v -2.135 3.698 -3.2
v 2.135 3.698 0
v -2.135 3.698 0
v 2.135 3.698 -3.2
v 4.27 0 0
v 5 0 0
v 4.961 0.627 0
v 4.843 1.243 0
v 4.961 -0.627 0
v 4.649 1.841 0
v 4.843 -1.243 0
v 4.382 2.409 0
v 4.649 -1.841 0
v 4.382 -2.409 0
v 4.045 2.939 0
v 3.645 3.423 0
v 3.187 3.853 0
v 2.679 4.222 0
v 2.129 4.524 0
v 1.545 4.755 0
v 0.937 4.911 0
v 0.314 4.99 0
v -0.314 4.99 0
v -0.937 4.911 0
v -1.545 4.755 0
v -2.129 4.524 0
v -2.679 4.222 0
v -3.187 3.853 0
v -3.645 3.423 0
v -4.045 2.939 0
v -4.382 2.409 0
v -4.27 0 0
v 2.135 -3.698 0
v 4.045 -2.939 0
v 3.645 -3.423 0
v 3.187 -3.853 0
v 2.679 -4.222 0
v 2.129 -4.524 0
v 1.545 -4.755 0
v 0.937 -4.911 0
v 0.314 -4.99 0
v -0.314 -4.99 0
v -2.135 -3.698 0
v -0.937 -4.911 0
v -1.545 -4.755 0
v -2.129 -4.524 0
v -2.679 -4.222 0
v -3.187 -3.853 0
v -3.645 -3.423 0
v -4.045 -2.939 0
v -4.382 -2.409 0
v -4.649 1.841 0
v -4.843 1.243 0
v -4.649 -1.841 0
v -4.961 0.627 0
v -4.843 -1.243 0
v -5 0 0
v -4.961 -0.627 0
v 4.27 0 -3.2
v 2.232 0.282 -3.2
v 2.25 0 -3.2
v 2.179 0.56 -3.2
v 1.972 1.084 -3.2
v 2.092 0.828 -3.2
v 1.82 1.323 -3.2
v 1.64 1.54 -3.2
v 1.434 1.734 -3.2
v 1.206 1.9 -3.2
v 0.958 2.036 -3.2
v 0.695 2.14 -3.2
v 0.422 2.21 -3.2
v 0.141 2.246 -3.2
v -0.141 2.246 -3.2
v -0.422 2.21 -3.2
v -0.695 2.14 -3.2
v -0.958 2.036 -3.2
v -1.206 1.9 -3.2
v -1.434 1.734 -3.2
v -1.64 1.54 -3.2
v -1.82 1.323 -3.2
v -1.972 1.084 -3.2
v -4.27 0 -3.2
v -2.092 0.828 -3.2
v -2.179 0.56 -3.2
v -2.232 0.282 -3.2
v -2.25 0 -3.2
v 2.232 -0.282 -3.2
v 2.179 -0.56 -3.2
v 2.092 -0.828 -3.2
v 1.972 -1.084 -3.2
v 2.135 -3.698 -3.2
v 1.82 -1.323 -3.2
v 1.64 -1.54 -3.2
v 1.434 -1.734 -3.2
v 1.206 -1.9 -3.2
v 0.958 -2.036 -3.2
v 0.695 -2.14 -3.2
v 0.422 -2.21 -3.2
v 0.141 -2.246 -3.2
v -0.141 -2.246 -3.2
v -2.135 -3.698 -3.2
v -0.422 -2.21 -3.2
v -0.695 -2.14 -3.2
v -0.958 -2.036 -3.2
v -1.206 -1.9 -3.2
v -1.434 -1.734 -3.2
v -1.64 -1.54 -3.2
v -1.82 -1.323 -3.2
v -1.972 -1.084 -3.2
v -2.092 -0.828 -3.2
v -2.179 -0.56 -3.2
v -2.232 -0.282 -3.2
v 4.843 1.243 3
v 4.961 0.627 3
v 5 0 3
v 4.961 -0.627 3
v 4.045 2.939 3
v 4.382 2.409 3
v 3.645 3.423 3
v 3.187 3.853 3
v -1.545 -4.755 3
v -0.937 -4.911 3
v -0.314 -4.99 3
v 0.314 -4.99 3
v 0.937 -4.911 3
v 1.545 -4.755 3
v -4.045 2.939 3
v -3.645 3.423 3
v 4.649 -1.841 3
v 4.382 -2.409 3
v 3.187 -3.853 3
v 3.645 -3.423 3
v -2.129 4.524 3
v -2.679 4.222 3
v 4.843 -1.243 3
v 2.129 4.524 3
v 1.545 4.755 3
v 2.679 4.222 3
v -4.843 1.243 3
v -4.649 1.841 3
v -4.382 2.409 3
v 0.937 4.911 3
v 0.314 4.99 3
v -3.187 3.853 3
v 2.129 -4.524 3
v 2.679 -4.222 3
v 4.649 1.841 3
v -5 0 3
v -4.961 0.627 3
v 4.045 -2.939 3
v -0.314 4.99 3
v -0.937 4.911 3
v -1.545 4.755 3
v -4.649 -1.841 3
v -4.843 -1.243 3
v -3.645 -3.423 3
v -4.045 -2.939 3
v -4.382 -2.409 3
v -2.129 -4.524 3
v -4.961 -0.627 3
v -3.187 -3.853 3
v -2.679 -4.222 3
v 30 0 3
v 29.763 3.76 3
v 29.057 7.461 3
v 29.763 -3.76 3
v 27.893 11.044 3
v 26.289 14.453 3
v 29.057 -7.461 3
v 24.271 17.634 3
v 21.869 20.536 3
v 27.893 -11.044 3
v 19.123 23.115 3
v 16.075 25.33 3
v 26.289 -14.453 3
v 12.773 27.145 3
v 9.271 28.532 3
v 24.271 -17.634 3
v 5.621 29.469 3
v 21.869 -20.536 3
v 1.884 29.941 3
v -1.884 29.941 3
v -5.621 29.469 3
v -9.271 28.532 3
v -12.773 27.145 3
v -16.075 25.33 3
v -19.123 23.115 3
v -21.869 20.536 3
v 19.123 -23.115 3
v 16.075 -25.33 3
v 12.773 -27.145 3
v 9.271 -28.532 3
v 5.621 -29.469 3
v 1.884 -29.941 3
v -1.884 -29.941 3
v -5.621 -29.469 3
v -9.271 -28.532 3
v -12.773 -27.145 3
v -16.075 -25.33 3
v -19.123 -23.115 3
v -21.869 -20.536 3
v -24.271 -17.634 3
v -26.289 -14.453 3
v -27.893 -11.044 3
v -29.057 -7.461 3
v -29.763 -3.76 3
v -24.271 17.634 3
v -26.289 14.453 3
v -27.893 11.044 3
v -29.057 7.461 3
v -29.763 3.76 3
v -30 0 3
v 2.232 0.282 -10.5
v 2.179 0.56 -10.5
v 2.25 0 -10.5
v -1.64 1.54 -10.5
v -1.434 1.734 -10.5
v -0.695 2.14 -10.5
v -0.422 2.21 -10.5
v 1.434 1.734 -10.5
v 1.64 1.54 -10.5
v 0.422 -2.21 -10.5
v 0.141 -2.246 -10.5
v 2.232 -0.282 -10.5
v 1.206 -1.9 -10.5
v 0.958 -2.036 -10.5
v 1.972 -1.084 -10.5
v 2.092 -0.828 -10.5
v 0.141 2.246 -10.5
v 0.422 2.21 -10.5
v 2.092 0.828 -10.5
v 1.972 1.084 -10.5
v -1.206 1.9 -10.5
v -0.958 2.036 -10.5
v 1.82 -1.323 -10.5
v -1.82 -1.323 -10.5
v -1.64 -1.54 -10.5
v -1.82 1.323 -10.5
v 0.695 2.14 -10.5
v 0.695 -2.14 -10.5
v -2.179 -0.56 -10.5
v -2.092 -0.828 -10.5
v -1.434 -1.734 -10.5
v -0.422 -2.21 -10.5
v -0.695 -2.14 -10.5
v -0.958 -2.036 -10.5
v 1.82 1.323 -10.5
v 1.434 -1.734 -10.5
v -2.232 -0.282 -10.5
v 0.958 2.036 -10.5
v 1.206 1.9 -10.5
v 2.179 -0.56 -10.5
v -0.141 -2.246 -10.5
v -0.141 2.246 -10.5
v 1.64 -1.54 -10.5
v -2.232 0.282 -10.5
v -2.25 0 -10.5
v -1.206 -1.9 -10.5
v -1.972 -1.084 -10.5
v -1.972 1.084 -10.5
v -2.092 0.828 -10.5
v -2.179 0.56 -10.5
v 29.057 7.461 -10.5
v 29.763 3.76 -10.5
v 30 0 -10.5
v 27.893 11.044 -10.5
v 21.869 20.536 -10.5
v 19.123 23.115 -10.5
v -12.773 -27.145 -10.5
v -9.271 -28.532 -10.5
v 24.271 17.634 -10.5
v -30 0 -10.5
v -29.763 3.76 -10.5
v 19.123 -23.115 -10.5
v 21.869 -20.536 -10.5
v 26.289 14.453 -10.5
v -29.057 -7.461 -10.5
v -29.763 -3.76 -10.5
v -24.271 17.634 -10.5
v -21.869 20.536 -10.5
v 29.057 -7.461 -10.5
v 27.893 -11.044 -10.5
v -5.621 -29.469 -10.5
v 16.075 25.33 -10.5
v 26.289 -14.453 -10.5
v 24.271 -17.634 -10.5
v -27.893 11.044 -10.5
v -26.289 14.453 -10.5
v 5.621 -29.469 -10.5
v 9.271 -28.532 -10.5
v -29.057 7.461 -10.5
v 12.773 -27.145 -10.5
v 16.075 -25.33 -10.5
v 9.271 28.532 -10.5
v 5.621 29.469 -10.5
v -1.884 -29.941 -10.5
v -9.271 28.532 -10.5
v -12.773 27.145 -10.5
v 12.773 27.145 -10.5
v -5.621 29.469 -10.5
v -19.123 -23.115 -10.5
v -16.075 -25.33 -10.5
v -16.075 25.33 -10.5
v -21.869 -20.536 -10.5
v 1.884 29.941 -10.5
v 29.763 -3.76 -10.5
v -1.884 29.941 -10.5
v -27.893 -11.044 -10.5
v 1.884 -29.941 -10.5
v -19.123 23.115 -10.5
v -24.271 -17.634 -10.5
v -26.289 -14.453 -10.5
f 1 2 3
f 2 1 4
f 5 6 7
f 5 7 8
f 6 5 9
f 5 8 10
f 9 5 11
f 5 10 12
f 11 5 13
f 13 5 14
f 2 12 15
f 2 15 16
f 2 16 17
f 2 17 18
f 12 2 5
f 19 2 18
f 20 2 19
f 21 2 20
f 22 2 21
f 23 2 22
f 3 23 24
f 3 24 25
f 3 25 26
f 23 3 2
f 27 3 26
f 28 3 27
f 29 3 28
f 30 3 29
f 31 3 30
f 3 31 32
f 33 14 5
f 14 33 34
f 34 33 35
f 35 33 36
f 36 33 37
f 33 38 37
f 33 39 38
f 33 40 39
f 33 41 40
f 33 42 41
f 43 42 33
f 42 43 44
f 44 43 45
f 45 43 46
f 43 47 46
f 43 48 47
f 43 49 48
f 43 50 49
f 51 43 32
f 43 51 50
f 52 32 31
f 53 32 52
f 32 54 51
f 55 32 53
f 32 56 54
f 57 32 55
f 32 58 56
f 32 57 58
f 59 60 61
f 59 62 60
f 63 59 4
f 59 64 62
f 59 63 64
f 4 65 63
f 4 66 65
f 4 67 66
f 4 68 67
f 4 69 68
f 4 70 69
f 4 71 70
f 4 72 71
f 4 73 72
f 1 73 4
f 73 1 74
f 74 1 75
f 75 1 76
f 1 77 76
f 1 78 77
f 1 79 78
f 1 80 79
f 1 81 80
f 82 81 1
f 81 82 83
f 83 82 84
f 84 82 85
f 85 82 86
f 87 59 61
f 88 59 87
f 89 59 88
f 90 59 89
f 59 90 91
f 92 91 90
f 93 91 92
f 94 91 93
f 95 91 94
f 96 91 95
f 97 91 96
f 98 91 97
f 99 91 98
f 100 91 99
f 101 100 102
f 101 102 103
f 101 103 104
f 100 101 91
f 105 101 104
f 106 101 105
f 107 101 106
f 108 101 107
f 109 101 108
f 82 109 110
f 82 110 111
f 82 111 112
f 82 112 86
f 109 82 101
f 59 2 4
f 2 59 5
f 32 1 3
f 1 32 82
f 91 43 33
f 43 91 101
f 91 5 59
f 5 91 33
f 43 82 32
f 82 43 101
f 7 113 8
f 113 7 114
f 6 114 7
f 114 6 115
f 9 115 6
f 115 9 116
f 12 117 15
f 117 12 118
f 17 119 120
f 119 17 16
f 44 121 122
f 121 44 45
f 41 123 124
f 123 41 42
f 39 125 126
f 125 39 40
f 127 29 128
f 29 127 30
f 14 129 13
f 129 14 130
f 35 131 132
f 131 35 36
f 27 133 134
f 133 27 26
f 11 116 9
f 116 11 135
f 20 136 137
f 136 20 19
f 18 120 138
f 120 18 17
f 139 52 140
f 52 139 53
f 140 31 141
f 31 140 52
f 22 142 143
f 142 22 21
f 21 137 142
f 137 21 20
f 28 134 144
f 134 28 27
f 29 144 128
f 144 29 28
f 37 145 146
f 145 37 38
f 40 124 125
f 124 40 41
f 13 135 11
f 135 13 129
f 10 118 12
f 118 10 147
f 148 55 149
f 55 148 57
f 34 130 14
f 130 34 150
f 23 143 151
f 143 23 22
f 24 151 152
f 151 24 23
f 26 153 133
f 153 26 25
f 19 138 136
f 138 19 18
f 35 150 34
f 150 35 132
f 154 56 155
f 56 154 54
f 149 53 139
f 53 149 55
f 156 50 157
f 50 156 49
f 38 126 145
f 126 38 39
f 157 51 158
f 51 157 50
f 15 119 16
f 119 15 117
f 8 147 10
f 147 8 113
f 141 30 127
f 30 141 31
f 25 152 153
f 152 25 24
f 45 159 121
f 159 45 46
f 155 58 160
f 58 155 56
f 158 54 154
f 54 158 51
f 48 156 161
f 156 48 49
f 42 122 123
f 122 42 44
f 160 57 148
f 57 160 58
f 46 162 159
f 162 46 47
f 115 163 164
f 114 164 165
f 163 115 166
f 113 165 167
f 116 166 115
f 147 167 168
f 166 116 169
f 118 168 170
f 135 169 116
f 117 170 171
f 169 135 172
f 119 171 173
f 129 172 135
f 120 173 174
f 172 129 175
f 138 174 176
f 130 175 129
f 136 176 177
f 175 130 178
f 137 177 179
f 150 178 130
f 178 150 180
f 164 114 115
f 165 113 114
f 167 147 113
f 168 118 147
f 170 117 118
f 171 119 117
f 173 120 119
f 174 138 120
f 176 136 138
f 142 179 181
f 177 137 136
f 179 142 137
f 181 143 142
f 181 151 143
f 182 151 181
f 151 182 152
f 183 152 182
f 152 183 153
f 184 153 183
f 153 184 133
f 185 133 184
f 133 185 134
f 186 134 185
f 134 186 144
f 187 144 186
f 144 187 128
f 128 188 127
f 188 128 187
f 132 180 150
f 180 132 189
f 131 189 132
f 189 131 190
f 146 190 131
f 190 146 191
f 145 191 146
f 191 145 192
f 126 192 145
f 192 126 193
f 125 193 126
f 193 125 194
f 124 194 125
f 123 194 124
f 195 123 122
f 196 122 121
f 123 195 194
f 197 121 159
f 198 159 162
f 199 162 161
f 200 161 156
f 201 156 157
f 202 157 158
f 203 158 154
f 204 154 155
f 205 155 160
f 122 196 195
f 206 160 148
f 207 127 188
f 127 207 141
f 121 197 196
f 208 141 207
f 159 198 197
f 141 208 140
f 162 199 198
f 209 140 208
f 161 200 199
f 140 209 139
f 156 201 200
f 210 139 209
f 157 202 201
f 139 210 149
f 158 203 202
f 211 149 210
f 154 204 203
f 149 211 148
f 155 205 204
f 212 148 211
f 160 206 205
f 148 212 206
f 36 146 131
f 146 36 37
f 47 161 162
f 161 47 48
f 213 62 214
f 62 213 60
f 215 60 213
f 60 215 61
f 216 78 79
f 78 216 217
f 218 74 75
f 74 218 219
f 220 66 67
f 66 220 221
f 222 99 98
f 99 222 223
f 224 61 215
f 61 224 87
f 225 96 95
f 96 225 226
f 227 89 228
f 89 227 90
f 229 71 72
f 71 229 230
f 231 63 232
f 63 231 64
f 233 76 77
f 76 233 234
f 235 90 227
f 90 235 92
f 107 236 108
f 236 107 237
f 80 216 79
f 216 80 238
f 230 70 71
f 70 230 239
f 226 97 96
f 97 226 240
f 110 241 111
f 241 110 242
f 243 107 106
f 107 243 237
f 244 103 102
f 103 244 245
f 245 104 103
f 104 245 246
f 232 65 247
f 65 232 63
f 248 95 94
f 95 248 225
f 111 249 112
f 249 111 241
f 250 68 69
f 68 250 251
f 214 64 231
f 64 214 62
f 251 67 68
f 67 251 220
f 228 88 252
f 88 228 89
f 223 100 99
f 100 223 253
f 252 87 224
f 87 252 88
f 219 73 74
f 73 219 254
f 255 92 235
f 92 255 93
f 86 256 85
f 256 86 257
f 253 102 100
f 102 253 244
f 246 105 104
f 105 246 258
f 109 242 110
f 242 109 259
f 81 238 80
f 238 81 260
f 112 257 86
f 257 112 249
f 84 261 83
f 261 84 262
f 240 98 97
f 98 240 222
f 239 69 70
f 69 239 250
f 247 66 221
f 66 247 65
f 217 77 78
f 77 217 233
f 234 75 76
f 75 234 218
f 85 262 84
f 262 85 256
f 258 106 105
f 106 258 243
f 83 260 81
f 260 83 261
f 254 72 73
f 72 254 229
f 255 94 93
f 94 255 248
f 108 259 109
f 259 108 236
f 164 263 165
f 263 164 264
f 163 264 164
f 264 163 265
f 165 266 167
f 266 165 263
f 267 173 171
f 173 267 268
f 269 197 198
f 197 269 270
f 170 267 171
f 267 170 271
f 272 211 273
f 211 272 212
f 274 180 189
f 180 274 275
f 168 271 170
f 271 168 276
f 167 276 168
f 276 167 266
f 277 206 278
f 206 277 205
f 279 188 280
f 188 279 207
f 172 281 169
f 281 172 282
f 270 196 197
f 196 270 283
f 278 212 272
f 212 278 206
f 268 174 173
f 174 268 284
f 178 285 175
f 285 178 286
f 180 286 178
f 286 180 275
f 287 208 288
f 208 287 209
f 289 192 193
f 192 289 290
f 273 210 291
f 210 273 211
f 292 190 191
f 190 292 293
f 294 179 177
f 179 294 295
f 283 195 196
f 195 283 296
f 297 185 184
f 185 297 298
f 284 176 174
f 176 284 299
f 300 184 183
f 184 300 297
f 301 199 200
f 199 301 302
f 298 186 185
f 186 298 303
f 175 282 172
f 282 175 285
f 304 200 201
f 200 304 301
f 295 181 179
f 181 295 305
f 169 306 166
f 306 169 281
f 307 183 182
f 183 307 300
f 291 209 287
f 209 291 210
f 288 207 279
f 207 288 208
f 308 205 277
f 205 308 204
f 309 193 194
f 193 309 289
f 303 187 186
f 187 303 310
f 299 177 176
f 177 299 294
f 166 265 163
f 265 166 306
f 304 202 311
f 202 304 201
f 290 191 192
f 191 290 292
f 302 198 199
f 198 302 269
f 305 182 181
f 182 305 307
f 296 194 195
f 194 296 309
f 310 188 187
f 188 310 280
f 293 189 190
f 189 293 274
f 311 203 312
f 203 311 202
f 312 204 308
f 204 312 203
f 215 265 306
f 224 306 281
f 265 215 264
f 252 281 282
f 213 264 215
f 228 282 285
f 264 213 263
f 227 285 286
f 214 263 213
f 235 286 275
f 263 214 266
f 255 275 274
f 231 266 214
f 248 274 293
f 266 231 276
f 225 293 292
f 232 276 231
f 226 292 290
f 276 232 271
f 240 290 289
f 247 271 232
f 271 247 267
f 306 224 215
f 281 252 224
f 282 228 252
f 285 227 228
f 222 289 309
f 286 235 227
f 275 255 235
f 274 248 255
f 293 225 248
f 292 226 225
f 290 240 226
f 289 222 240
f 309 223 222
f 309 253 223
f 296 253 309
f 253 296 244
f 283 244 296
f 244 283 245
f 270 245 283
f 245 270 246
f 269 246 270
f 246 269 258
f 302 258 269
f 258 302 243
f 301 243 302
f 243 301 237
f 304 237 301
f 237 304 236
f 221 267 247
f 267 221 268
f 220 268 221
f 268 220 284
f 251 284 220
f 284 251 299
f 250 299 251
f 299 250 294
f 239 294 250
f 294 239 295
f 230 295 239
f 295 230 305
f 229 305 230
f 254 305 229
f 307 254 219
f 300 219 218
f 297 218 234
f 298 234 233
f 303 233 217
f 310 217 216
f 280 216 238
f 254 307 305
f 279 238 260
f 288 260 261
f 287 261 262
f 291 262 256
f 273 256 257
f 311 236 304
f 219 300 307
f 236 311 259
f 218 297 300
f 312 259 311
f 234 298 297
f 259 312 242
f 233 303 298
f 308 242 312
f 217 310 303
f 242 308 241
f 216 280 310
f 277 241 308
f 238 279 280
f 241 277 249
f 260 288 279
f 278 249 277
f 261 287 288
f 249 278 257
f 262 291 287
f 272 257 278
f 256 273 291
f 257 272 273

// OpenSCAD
$fn = 50;


difference() {
	union() {
		translate(v = [0, 0, -10.5000000000]) {
			cylinder(h = 13.5000000000, r = 30.0000000000);
		}
	}
	union() {
		translate(v = [0, 0, 0]) {
			rotate(a = [0, 0, 0]) {
				difference() {
					union() {
						translate(v = [0, 0, -3.2000000000]) {
							linear_extrude(height = 3.2000000000) {
								polygon(points = [[4.2698000000, 0.0000000000], [2.1349000000, 3.6977552691], [-2.1349000000, 3.6977552691], [-4.2698000000, 0.0000000000], [-2.1349000000, -3.6977552691], [2.1349000000, -3.6977552691]]);
							}
						}
					}
					union();
				}
			}
		}
		#cylinder(h = 3, r = 5.0000000000);
		#translate(v = [0, 0, -100.0000000000]) {
			cylinder(h = 200, r = 2.2500000000);
		}
	}
}
